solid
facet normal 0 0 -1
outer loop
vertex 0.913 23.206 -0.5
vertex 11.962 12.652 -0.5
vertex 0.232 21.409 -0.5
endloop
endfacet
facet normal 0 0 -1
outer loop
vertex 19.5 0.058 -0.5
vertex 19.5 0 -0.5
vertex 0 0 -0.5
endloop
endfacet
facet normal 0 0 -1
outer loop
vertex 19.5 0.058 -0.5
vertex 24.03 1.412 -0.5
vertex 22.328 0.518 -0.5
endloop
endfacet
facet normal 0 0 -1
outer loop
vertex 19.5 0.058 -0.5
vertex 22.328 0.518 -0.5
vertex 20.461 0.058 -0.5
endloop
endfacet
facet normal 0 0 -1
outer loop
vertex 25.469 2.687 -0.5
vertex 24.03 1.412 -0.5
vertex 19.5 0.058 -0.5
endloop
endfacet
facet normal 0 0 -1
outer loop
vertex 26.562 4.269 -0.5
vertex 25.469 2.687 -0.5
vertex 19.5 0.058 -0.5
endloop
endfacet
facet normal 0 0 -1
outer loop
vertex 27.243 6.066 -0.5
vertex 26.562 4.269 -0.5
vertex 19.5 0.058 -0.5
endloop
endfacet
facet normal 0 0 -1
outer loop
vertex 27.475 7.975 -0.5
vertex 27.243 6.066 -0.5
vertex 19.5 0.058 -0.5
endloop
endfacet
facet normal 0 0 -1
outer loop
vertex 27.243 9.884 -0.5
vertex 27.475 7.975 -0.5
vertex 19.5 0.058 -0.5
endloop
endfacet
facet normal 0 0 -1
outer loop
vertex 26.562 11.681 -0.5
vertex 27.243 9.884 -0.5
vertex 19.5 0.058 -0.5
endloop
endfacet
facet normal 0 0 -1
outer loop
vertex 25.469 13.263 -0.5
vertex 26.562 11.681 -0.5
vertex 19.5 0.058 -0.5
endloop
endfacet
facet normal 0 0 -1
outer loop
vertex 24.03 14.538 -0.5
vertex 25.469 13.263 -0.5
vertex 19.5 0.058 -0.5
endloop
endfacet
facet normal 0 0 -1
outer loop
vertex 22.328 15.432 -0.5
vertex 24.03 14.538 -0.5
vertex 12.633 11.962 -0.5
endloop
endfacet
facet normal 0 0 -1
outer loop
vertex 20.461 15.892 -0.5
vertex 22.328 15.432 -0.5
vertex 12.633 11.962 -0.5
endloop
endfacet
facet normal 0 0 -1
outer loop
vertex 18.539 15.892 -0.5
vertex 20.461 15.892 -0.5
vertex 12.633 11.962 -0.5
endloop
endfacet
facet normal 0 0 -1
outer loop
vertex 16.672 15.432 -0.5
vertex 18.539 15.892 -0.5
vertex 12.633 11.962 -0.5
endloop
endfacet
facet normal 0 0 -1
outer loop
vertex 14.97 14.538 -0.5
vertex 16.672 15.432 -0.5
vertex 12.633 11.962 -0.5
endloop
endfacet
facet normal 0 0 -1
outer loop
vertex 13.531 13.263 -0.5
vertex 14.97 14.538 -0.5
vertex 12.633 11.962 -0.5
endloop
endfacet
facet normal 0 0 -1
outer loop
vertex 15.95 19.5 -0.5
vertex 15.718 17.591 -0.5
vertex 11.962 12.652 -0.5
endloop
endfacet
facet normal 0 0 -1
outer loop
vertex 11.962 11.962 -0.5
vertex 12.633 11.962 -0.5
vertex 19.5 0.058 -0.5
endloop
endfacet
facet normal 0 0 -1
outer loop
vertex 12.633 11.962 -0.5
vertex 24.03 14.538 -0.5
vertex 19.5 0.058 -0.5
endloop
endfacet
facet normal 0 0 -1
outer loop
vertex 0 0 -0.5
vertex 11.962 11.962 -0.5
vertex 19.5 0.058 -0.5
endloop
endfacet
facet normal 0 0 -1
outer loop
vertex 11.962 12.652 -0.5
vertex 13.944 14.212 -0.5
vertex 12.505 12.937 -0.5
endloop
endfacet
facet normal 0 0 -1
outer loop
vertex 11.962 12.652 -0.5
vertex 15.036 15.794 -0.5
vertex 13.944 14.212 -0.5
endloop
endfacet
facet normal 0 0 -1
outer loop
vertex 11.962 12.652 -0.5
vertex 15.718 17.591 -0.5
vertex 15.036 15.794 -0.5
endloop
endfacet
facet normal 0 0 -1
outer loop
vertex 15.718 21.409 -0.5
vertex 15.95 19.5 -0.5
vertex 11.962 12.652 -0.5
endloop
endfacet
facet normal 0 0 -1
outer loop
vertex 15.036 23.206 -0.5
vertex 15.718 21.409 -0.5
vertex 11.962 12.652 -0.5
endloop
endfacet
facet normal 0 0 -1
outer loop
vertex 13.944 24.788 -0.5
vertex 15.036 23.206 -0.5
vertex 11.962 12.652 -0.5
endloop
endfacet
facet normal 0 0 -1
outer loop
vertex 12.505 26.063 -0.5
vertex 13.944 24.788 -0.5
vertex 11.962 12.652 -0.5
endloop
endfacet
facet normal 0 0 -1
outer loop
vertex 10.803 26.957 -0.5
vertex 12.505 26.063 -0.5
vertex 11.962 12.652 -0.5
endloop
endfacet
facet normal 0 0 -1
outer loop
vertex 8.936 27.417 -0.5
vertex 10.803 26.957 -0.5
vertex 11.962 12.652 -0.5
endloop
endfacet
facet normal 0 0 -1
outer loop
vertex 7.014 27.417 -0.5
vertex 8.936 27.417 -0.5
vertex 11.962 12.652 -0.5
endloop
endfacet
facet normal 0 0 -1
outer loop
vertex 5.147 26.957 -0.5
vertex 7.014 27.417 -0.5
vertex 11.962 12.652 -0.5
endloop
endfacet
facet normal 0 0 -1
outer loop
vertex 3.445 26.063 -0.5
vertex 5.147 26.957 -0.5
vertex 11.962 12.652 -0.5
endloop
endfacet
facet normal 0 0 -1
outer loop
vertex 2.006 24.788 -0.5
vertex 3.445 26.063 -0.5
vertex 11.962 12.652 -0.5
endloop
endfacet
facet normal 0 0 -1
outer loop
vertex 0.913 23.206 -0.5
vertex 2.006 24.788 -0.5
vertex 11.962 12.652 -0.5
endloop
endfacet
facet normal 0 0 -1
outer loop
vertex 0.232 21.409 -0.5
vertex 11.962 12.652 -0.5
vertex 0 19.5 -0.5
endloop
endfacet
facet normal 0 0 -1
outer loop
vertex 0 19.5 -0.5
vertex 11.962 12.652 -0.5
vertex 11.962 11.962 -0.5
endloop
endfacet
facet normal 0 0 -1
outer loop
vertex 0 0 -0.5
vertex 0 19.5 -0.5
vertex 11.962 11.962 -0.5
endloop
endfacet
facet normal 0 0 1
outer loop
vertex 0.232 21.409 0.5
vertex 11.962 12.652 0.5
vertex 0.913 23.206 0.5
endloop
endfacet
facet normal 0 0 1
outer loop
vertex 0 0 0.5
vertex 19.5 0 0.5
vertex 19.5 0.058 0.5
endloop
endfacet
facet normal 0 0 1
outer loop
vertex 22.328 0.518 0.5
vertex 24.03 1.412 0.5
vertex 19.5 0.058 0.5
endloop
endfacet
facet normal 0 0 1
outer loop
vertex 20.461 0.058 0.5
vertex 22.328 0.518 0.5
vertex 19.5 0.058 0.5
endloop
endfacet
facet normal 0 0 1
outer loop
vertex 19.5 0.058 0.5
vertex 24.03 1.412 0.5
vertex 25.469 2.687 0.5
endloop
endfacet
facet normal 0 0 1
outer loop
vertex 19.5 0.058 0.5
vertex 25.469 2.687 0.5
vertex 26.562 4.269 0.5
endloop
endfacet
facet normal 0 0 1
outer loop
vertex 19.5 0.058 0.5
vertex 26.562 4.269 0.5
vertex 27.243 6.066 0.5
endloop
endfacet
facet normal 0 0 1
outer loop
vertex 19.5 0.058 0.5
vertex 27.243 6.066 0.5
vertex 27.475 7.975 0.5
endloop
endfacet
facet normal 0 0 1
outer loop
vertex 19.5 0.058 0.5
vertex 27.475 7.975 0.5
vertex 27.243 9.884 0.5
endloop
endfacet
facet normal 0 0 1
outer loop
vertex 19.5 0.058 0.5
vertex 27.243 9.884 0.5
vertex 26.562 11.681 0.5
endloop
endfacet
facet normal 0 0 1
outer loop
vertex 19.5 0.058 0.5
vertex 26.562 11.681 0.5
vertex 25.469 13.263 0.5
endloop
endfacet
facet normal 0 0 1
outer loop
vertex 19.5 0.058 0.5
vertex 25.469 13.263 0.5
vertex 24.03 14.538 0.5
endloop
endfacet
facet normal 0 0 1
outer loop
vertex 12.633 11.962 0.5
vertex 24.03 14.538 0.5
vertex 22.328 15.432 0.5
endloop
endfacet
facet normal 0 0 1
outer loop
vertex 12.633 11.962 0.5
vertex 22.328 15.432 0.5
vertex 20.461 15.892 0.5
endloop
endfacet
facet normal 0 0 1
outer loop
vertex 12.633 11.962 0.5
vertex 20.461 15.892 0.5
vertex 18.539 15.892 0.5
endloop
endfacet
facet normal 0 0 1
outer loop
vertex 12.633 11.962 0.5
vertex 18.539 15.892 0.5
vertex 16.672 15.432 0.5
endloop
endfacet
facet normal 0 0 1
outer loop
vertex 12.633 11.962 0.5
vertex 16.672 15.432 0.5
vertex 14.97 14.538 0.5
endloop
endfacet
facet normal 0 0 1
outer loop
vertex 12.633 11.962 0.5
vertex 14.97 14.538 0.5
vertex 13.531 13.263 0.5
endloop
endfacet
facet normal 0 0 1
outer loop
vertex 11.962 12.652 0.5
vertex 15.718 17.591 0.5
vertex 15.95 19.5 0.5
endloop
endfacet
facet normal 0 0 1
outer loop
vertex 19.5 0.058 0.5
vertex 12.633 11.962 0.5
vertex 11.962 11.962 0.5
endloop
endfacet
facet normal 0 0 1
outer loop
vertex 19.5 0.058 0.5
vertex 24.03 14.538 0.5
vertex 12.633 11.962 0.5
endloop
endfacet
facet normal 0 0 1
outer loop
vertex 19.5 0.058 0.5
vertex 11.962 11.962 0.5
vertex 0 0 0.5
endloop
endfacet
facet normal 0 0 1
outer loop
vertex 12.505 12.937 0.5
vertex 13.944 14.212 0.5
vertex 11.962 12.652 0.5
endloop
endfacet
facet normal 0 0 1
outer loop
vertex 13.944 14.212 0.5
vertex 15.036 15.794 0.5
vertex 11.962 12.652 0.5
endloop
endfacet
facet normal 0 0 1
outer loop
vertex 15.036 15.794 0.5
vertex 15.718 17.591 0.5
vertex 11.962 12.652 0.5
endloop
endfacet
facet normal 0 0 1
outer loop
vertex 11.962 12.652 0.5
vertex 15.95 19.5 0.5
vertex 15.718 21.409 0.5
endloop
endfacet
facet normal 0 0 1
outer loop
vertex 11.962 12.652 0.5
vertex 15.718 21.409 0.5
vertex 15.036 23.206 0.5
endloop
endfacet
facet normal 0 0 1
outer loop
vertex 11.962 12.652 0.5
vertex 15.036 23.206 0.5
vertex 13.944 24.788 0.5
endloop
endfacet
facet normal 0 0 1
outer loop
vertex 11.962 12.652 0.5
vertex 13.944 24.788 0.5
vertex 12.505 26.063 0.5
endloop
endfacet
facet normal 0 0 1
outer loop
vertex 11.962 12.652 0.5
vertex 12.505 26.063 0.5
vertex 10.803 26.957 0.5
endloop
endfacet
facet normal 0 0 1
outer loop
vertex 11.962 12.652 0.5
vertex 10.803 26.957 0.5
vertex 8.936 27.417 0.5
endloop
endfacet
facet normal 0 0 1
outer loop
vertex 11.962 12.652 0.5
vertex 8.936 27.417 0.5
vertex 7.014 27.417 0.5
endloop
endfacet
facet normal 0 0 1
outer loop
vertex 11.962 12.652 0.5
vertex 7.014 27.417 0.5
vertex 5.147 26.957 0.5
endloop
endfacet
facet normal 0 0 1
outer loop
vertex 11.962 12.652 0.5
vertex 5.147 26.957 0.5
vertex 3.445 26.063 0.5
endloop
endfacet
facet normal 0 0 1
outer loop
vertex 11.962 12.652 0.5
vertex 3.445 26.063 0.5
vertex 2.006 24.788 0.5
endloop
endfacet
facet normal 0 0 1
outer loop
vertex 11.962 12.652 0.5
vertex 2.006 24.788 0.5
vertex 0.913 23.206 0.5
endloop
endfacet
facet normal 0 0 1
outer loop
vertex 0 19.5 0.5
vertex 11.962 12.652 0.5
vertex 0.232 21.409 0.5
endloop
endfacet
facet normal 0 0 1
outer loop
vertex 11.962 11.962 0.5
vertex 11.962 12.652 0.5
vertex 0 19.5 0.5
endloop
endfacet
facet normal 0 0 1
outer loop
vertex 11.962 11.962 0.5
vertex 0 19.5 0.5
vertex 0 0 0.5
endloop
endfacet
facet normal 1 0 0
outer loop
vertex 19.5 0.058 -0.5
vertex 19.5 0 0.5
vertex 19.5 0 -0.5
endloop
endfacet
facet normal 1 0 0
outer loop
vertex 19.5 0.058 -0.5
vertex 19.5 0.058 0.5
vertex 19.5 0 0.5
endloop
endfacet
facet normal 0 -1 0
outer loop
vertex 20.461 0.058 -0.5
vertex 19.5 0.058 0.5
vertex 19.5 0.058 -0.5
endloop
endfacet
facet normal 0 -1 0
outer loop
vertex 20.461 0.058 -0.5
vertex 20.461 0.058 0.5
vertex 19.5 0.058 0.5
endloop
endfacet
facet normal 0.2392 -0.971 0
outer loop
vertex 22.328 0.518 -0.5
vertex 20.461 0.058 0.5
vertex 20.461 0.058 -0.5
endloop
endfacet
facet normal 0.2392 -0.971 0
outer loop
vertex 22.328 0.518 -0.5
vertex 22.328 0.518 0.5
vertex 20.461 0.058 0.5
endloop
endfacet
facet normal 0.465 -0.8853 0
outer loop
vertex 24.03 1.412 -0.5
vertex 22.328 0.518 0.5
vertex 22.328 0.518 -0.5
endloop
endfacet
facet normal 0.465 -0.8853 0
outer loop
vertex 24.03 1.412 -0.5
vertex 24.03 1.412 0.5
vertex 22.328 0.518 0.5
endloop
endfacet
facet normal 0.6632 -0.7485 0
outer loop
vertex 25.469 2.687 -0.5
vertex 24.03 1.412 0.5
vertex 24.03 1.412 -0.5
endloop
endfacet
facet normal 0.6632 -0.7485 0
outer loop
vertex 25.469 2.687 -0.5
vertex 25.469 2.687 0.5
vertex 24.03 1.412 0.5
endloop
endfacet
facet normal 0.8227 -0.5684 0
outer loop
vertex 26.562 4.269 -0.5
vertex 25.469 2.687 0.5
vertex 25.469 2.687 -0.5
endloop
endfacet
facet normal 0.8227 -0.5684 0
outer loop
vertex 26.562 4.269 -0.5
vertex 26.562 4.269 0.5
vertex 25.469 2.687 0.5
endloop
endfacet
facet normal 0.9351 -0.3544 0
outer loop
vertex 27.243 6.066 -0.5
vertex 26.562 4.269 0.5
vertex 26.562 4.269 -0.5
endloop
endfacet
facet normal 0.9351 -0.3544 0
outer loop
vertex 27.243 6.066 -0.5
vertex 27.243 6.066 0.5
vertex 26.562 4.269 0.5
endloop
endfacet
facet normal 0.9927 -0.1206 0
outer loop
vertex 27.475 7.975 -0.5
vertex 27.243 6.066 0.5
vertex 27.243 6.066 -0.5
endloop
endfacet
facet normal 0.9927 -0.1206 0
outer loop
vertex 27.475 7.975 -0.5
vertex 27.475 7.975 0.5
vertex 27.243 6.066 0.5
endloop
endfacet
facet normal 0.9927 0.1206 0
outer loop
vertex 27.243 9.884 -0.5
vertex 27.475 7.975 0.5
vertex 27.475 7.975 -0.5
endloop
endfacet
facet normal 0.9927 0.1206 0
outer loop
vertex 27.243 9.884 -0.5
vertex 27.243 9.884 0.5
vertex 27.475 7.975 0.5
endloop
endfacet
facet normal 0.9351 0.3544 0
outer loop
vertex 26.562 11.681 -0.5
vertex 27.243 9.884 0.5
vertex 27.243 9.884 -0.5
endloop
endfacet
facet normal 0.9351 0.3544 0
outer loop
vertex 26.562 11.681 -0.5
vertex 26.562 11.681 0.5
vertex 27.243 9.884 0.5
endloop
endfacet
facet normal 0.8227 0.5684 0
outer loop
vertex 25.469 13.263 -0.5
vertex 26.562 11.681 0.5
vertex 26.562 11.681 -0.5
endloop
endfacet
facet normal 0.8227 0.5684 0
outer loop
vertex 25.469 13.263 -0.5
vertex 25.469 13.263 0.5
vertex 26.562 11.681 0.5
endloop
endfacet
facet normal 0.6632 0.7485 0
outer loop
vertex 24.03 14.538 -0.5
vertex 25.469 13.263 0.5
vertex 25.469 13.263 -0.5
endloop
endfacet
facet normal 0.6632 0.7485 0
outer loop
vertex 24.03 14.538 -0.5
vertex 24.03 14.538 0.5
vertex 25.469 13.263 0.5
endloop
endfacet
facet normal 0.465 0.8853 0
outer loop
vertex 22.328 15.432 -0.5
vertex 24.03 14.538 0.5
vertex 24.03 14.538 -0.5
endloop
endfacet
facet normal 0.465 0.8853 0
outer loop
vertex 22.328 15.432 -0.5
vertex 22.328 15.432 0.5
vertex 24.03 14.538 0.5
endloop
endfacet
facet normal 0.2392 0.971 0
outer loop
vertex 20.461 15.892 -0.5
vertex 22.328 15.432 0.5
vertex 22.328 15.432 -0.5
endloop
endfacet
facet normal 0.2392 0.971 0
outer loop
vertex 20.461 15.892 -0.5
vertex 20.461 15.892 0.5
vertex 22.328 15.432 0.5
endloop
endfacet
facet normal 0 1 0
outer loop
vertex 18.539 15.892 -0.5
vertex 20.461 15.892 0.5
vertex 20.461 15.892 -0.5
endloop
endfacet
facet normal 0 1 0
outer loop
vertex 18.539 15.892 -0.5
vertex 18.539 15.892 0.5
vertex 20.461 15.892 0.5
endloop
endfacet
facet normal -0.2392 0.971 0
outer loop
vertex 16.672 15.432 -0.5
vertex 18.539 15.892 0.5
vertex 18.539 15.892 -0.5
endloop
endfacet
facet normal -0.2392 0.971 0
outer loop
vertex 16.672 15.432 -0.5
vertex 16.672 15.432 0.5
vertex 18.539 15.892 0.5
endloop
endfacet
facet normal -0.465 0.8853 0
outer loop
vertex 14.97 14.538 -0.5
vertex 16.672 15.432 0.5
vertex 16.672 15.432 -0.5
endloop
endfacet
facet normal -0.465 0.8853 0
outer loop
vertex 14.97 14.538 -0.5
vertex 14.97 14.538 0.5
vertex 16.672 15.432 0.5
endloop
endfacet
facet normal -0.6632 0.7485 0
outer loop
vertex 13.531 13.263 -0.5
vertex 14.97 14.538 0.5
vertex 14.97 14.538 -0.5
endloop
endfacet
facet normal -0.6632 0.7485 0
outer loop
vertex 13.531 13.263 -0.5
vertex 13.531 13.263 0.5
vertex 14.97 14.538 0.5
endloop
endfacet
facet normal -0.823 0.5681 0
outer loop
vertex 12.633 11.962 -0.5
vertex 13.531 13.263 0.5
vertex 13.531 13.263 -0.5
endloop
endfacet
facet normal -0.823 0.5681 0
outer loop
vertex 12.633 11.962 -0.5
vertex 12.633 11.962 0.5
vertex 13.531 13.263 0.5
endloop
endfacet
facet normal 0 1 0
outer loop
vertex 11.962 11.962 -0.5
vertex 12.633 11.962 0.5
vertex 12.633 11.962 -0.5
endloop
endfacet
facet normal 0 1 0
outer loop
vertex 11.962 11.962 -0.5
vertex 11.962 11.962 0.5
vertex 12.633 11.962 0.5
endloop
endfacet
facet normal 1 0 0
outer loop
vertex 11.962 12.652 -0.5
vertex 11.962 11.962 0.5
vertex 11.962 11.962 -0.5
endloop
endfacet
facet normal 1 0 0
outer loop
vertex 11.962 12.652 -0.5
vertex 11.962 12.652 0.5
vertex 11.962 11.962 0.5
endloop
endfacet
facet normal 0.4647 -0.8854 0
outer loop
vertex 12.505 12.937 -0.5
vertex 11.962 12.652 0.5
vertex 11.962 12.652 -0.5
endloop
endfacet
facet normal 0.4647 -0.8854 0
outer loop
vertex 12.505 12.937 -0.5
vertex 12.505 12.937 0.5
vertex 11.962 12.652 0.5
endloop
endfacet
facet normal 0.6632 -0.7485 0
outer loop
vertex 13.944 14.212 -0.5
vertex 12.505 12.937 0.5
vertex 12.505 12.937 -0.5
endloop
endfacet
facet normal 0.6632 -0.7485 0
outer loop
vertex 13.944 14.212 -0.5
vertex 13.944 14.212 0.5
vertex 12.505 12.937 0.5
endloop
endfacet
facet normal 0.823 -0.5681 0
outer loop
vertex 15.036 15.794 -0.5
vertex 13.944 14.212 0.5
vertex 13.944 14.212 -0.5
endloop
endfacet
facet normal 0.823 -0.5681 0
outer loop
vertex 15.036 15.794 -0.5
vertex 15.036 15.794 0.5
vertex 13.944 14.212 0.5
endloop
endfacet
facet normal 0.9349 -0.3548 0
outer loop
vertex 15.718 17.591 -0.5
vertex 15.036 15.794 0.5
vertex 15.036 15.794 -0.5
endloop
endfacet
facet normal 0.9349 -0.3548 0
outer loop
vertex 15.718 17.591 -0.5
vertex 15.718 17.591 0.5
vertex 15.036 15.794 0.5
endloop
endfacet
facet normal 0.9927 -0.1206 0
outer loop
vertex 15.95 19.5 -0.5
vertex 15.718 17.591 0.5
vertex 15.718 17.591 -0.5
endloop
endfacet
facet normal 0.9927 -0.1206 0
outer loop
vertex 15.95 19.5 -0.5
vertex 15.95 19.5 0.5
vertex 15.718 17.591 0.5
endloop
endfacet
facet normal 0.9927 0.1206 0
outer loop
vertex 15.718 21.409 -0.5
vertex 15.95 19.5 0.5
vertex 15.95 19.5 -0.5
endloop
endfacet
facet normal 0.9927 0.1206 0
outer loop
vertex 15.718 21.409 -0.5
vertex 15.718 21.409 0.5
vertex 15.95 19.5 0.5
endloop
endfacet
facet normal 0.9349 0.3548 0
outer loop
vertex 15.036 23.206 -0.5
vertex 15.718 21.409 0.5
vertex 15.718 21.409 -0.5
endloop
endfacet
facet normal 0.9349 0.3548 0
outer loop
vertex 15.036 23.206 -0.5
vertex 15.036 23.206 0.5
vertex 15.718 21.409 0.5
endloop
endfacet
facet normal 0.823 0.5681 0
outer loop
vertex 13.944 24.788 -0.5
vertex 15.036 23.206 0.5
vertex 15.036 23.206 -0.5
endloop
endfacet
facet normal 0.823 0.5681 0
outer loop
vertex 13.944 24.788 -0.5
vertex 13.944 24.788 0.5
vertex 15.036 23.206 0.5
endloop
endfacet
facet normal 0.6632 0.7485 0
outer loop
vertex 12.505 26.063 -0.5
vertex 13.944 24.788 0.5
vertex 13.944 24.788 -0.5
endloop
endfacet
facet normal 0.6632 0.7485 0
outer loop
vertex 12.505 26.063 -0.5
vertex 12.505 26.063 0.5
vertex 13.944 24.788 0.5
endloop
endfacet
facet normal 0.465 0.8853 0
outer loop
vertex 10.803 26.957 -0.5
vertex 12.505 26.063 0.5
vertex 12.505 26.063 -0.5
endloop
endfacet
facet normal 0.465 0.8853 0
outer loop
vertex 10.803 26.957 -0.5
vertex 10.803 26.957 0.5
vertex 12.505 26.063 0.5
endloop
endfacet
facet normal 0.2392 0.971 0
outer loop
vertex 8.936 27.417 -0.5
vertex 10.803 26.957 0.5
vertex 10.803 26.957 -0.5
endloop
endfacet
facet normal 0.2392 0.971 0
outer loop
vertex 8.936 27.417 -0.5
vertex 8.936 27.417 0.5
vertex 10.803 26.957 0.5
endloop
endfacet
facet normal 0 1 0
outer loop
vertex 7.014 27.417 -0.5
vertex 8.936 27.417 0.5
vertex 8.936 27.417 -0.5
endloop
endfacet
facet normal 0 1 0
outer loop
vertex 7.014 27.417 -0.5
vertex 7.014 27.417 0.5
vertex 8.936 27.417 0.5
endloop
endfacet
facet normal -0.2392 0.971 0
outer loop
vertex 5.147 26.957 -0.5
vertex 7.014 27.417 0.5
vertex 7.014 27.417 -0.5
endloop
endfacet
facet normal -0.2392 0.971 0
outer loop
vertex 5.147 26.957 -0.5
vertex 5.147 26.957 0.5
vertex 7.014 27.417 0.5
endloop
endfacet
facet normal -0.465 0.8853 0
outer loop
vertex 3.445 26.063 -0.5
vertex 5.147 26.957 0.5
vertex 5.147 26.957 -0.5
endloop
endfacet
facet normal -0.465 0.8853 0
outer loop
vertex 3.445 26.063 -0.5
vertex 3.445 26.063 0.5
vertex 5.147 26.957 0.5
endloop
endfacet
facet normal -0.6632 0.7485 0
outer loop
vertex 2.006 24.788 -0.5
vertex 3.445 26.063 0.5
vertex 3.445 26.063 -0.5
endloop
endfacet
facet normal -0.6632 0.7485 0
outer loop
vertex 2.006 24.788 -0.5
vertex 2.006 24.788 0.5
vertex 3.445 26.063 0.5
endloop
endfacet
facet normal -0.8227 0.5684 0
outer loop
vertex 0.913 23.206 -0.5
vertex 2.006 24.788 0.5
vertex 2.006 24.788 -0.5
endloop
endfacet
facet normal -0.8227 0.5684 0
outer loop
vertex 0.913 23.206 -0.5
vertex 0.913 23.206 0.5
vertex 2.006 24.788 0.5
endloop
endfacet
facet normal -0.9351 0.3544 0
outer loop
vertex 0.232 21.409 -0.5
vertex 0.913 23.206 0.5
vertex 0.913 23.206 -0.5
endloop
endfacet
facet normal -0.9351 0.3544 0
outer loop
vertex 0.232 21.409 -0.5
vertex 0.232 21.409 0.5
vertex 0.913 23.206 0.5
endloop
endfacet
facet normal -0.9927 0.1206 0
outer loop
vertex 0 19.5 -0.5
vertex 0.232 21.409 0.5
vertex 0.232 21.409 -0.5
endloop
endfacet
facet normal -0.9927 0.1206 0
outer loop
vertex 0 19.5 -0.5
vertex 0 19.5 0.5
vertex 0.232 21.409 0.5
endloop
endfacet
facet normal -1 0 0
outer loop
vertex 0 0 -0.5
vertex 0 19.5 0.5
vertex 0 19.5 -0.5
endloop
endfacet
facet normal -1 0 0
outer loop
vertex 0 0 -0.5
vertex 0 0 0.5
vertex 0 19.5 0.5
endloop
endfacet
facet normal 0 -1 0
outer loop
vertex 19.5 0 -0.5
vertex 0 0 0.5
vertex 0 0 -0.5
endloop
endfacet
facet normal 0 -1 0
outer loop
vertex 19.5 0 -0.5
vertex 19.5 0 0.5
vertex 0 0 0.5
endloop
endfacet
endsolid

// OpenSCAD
// file: led_inset.scad
t = 1;
led_r = 3.36/2;
wire_d = 2.77 - 0.48; //2.54;
wire_h = 0.8;

eps = 0.2;
$fn=20;

module led_inset(led_r = led_r, t = t, wire_d=wire_d, eps=0.2){
    translate([0, 0, t/2])
    cylinder(t, led_r + eps, led_r + eps, center=true);
    translate([0, wire_d/2, 0])
    cylinder(t, wire_h, wire_h, center=true);
    translate([0, -wire_d/2, 0])
    cylinder(t, wire_h, wire_h, center=true);
}
difference(){
    cube([8, 8, t], center=true);
    led_inset();
}
// main file
use <led_inset.scad>

t=1;
//cube([40, 40, t], center=true);
led_r = 3.36/2;
led_dist = 5.5;
led_margin = 3;

sq = led_margin + led_dist*3;
r = led_dist*1.45;

module flat_heart(sq=sq, r=r) {
  square([sq, r*1.5]);
  square([r*1.5, sq]);

  translate([r, sq, 0])
  circle(r);

  translate([sq, r, 0])
  circle(r);
}

module led_heart(){
    difference(){
        linear_extrude(height = t, center=true) 
        flat_heart();
        for (xy = [led_margin:led_dist:sq]){
            translate([xy, led_margin, 0]) led_inset();
            if (xy > led_margin){
                translate([led_margin, xy, 0]) rotate(90) led_inset();
            }
        }
        new_r = r - led_margin;
        angular_dist = 180 * (led_dist / new_r) / PI;
        for (theta = [0: angular_dist: 220]){
            translate([r - cos(theta)  * new_r, sq + sin(theta) * new_r, 0]) rotate(90 -theta) led_inset();
            translate([sq + sin(theta)  * new_r, r - cos(theta) * new_r, 0]) rotate(theta) led_inset();
        }
        translate([sq - 4.3*led_r, sq - 4.3*led_r, 0]) led_inset();
        
        
        
        for (xy = [led_r * 2 + led_margin:led_dist:sq/2]){
            //translate([xy, led_margin, 0]) led_inset();
            if (xy > led_margin){
                //translate([led_margin, xy, 0]) rotate(90) led_inset();
            }
        }
        new_r = r - led_margin;
        angular_dist = 180 * (led_dist / new_r) / PI;
        for (theta = [0: angular_dist: 220]){
            translate([r - cos(theta)  * new_r, sq + sin(theta) * new_r, 0]) rotate(90 -theta) led_inset();
            translate([sq + sin(theta)  * new_r, r - cos(theta) * new_r, 0]) rotate(theta) led_inset();
        }
        translate([sq - 4.3*led_r, sq - 4.3*led_r, 0]) led_inset();
    }
}

linear_extrude(height = t, center=true) 
flat_heart();
